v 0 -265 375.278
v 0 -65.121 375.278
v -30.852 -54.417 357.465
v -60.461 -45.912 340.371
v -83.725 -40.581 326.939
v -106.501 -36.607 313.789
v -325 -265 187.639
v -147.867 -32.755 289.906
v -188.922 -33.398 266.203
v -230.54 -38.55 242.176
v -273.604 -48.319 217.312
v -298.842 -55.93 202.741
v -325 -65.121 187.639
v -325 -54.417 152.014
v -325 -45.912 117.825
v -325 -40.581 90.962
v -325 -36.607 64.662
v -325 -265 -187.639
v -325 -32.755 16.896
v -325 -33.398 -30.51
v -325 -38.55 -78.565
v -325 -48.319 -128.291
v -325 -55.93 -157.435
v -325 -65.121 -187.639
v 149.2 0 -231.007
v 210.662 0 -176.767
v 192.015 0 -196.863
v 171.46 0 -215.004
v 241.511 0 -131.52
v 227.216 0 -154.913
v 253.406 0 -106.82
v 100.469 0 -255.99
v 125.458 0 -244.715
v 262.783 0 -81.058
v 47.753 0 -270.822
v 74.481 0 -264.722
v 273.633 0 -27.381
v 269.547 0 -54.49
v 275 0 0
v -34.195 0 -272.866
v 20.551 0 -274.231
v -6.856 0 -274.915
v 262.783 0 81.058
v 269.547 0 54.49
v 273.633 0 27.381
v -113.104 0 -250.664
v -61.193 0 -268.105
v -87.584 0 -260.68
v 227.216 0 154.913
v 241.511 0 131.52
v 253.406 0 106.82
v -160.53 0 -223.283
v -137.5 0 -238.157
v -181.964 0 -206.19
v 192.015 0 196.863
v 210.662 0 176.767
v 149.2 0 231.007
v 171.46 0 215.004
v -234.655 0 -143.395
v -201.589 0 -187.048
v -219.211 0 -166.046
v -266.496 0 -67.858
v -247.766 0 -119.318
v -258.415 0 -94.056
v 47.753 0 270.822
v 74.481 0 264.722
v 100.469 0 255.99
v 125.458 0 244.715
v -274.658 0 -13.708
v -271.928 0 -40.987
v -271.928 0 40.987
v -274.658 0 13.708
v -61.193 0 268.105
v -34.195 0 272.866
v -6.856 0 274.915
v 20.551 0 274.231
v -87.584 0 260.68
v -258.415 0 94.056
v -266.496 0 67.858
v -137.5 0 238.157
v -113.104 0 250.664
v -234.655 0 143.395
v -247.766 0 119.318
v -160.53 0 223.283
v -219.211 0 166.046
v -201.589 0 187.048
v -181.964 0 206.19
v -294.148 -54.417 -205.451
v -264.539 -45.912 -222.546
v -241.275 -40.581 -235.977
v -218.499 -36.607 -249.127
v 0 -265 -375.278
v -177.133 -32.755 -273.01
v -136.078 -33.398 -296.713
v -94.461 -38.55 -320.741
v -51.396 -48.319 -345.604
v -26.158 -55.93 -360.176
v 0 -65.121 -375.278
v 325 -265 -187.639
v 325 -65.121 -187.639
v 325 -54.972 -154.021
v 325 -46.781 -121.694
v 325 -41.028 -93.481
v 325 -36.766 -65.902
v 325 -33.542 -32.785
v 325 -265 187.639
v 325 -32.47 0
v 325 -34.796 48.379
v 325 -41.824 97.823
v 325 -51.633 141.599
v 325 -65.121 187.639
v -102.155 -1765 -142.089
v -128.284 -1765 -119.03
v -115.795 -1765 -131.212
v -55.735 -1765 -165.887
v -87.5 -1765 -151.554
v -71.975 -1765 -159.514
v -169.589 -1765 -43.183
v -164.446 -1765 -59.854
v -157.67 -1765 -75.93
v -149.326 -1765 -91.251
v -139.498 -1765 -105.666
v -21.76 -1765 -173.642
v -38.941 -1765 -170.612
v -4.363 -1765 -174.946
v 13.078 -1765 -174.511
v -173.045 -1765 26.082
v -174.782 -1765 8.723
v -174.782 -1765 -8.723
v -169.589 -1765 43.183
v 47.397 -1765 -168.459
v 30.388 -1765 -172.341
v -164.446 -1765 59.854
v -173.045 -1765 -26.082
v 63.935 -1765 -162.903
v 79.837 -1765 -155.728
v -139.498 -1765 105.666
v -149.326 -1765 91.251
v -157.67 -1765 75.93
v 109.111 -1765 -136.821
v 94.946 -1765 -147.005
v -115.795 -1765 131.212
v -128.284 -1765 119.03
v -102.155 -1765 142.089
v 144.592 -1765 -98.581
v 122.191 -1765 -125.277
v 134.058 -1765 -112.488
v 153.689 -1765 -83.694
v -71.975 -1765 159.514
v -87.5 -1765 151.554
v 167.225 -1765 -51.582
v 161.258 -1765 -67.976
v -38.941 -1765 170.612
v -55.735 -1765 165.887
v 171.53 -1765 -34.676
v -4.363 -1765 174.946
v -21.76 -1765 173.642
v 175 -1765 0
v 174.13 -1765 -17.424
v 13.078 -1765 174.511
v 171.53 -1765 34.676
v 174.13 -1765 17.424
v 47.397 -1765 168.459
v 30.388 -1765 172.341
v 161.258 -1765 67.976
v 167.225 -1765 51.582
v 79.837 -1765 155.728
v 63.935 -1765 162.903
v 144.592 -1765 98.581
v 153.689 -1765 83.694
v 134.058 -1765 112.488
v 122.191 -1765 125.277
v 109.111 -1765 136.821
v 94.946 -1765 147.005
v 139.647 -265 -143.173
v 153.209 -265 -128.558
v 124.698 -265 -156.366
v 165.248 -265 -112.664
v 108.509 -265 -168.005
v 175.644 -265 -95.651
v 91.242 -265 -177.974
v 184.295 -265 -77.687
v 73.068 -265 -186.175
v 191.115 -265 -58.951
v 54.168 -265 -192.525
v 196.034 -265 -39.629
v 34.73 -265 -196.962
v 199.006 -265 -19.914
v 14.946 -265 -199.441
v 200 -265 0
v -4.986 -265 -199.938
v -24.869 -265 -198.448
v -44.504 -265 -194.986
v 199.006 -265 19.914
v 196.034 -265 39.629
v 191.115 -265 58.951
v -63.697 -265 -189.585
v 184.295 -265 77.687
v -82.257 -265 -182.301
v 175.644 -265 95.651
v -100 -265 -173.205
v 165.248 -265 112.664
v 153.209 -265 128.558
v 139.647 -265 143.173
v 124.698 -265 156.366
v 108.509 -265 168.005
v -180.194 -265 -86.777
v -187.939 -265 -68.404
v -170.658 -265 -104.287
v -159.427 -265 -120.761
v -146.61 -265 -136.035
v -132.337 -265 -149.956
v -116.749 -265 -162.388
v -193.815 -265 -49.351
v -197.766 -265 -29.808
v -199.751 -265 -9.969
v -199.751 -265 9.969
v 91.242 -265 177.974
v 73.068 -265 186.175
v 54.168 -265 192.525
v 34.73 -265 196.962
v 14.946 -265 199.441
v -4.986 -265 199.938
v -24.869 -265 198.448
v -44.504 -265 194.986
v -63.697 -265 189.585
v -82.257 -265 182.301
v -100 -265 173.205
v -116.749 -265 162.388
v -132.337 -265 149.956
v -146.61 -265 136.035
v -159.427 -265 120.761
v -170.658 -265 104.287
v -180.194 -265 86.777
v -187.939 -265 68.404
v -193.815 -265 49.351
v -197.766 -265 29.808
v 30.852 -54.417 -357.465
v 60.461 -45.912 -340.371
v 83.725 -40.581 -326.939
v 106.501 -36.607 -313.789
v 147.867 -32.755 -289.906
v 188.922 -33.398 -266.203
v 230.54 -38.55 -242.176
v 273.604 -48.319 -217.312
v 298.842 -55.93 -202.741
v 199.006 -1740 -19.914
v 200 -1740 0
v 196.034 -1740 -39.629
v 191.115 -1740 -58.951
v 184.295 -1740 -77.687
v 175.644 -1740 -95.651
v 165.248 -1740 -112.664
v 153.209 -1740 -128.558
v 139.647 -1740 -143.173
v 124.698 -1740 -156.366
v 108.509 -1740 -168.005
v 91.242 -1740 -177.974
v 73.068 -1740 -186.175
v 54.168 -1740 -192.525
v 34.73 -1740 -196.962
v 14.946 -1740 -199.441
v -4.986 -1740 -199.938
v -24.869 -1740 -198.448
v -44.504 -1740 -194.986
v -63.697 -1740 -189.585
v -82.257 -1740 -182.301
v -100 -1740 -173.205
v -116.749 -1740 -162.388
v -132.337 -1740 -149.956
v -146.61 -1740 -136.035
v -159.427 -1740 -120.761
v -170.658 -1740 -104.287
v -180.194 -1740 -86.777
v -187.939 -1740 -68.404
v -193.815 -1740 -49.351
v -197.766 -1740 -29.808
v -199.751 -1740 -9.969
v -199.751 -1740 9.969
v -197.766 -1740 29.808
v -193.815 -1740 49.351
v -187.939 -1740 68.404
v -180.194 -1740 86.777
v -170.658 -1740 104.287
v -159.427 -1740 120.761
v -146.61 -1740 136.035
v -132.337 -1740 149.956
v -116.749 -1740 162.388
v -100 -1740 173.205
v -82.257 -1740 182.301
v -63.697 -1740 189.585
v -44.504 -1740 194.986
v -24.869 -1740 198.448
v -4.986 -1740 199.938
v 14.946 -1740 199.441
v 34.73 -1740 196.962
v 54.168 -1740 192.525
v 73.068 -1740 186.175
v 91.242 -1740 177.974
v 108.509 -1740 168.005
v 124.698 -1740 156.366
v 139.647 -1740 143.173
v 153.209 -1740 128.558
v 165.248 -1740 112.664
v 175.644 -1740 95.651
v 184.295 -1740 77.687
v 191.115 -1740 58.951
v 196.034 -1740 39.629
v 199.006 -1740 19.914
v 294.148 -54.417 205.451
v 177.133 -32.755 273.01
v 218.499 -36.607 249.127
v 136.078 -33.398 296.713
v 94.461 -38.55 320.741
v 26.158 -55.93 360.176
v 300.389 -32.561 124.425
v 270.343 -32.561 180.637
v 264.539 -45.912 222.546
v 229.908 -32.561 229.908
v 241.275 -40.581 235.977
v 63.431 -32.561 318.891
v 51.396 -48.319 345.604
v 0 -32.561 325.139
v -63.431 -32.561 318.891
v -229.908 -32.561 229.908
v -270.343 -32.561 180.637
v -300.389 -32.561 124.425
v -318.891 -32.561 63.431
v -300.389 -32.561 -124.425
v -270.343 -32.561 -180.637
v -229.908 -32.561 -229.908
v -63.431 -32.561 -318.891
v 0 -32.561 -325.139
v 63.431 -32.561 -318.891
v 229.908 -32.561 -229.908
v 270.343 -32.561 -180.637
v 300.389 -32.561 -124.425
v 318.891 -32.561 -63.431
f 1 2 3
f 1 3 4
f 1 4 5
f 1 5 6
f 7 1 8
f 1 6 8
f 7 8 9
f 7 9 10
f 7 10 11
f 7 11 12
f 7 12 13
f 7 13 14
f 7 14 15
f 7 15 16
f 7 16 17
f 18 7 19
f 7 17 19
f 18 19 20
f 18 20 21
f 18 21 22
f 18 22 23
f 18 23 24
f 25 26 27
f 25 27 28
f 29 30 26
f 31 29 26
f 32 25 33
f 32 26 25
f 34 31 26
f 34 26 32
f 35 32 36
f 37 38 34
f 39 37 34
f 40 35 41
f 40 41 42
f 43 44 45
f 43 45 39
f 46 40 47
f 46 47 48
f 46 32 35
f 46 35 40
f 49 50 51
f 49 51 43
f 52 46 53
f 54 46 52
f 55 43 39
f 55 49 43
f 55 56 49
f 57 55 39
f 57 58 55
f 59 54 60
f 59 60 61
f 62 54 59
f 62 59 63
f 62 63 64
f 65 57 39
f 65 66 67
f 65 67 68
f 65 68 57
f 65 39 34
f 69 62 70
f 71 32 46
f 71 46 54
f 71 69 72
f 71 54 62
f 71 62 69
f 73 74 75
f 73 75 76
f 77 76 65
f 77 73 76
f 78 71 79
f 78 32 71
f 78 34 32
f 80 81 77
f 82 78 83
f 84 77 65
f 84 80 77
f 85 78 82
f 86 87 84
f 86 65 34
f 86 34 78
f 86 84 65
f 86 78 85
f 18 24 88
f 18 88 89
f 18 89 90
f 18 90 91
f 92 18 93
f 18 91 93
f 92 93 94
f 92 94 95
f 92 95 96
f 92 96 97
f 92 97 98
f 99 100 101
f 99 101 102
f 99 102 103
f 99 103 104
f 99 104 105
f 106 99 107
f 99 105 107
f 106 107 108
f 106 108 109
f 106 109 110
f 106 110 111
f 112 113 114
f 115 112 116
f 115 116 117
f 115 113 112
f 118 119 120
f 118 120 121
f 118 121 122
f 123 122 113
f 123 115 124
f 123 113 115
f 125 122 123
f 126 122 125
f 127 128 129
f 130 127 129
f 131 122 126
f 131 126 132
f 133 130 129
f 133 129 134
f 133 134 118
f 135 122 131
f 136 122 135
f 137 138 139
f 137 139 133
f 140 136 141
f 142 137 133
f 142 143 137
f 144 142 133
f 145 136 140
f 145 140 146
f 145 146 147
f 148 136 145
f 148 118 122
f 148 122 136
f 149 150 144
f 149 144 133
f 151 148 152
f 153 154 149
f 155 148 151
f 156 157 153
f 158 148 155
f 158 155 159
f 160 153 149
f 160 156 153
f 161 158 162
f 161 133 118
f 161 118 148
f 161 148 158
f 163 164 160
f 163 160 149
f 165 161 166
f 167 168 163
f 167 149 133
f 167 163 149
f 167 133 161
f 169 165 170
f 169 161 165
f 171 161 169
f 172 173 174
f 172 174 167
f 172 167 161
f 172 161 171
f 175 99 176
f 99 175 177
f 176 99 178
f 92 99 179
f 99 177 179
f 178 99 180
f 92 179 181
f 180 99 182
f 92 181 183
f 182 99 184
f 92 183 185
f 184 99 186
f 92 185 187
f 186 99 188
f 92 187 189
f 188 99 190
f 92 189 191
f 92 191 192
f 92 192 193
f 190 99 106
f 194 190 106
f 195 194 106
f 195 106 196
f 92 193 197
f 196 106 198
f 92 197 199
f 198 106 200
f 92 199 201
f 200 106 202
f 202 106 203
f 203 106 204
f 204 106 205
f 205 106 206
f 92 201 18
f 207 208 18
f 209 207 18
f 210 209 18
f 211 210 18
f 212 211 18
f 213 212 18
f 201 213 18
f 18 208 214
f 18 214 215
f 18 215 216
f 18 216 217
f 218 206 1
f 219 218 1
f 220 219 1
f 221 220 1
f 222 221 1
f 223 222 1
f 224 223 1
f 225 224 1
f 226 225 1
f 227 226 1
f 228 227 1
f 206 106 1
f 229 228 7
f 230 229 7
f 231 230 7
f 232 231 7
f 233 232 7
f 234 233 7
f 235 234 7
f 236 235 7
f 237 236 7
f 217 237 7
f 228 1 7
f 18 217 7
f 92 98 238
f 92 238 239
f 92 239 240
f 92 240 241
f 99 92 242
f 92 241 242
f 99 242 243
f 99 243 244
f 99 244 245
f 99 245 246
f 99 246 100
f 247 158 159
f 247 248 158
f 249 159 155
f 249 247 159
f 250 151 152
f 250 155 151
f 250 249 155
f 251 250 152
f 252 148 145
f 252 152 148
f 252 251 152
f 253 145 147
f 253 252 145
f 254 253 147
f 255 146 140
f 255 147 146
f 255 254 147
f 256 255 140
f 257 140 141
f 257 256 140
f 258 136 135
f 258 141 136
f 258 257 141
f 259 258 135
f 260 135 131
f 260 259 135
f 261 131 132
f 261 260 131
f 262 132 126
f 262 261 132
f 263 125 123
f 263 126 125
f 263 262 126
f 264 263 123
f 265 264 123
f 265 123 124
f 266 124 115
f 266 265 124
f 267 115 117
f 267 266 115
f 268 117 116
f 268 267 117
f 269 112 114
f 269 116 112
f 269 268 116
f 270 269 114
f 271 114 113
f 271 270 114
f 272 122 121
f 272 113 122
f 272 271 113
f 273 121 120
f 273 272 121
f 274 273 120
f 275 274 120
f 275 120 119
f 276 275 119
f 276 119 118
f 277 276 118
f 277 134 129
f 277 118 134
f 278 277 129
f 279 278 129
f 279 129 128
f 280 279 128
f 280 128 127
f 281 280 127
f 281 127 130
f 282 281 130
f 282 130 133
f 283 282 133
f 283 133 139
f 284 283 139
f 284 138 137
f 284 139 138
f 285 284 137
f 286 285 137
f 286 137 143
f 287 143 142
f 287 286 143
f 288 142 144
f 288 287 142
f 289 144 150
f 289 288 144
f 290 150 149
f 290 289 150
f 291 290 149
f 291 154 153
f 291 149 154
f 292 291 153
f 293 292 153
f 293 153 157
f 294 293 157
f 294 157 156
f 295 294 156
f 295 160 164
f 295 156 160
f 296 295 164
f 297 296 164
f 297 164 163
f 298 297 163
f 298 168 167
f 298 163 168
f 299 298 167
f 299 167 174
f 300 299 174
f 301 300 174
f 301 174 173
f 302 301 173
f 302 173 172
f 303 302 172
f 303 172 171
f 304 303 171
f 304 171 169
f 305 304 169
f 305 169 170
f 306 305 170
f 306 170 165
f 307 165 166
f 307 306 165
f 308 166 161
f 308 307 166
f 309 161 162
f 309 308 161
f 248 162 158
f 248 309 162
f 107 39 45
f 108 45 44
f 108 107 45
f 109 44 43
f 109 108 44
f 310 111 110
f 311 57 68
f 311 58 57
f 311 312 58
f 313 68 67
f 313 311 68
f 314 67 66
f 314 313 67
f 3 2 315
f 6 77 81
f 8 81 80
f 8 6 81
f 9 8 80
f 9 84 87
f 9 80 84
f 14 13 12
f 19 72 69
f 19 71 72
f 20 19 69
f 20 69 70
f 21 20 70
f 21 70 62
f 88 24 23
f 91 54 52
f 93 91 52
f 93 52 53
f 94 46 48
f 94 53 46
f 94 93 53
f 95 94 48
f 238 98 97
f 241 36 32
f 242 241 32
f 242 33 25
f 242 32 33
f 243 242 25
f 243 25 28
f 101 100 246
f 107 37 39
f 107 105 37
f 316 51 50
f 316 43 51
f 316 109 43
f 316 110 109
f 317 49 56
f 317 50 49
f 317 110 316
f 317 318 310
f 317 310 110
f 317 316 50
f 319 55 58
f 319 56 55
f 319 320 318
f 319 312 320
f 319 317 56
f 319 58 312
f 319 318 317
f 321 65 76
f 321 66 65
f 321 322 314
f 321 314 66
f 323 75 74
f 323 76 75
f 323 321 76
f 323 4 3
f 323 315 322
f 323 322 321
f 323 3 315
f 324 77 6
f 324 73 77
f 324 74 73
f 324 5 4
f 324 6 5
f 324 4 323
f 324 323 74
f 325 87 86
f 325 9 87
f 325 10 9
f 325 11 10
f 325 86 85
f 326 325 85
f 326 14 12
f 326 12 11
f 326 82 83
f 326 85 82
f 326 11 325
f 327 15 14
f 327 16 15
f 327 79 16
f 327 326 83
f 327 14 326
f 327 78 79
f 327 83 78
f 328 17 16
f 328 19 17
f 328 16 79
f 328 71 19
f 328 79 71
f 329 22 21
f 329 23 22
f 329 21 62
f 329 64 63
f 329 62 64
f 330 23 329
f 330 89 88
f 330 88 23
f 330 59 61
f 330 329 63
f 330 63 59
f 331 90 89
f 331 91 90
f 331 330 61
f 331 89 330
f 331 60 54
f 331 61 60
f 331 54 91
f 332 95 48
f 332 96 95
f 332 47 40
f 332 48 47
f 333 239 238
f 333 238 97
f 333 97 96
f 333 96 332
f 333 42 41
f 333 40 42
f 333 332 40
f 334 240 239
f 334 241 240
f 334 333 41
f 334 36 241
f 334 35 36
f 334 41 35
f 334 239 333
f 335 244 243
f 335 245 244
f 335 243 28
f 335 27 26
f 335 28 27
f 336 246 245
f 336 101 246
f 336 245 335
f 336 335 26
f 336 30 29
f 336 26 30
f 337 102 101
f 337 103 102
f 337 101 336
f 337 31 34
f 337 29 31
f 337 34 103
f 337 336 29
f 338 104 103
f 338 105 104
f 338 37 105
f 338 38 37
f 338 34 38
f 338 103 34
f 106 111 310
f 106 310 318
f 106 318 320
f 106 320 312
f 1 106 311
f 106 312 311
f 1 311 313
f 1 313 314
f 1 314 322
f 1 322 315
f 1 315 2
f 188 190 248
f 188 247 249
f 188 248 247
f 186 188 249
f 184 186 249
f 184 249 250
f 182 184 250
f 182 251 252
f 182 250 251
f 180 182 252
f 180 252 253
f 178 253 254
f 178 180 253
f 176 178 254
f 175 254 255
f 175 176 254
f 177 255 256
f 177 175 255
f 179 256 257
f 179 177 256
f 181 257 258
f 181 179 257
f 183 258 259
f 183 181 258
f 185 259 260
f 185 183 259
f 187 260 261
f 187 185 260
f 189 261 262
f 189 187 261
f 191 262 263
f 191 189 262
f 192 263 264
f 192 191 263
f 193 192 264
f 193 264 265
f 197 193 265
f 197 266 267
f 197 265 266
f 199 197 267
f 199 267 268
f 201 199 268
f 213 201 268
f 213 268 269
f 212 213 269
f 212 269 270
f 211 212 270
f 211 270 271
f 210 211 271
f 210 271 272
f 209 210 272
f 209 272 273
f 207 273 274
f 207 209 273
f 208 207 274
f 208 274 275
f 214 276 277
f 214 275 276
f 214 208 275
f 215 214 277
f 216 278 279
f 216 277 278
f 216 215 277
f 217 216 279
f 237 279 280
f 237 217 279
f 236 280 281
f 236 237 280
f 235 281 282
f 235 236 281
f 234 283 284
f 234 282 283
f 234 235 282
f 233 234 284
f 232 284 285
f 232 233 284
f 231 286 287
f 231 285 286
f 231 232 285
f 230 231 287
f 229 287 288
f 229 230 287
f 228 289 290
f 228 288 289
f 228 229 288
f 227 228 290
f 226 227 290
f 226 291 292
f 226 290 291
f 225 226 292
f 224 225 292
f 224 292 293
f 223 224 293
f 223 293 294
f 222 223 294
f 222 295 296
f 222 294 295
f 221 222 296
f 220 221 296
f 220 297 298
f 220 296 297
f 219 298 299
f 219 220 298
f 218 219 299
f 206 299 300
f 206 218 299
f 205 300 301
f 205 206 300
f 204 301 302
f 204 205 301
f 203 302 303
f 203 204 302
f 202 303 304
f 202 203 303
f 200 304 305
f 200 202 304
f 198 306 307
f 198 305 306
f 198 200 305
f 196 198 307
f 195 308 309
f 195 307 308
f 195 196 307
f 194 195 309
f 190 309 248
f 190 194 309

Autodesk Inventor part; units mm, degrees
ref_plane "YZ Plane" through (0, 0, 0) normal (1, 0, 0) x (0, 1, 0)
ref_plane "XZ Plane" through (0, 0, 0) normal (0, 1, 0) x (-1, 0, 0)
sketch "Sketch1" plane through (0, 0, 0) normal (0, 1, 0) x (-1, 0, 0)
  line L0 (325, -187.6388) -> (0, -375.2777)
  line L1 (0, -375.2777) -> (-325, -187.6388)
  line L2 (-325, -187.6388) -> (-325, 187.6388)
  line L3 (-325, 187.6388) -> (0, 375.2777)
  line L4 (0, 375.2777) -> (325, 187.6388)
  line L5 (325, 187.6388) -> (325, -187.6388)
  point P0 (0, 0)
  point P1 (0, 0)
  point P2 (325, 0)
extrude "Extrusion1" add sketch "Sketch1" against normal blind 265
sketch "Sketch2" plane through (0, -265, 0) normal (0, -1, 0) x (1, 0, 0)
  circle A0 centre (0, 0) radius 200
  dimension "d4" = 400
extrude "Extrusion2" add sketch "Sketch2" along normal blind 1500
chamfer "Chamfer1" distance 25 angle 45 1 edges at (-200, -1765, 0)
ref_plane "Work Plane1" through (0, 0, 0) normal (0, 0, 1) x (1, 0, 0)
sketch "Sketch3" plane through (0, 0, 0) normal (0, 0, 1) x (1, 0, 0)
  point P0 (0, 0)
sketch "Sketch4" plane through (0, 0, 0) normal (0, 0, 1) x (1, 0, 0)
  line L0 (0, 0) -> (275, 0)
  line L1 (0, 0) -> (325, 0) projected
  line L2 (275, 0) -> (497.8484, -144.7195)
  line L3 (275, 0) -> (540.7163, 0) construction
  line L4 (497.8484, -144.7195) -> (497.8484, 0)
  line L5 (497.8484, 0) -> (275, 0)
  line L6 (0, -2118) -> (0, 353) projected
  dimension "d11" = 275
  dimension "d12" = 33
revolve "Revolution1" cut sketch "Sketch4" angle 360 about axis through (0, -10, 0) along (0, 1, 0)
